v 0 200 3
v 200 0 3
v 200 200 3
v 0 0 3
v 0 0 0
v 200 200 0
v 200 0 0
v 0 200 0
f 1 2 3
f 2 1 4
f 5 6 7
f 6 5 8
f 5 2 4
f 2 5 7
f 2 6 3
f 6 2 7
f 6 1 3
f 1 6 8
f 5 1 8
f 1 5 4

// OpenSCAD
// F. Beachler, Longevity Software LLC. d.b.a. Terawatt Industries

$fn=50;
height = 200;
width = 200;
depth = 3;

heatbed(height, width, depth);

module heatbed(h = height, w = width, t = depth) {
	color([255, 0, 0]) cube([h, w, t]);
}
